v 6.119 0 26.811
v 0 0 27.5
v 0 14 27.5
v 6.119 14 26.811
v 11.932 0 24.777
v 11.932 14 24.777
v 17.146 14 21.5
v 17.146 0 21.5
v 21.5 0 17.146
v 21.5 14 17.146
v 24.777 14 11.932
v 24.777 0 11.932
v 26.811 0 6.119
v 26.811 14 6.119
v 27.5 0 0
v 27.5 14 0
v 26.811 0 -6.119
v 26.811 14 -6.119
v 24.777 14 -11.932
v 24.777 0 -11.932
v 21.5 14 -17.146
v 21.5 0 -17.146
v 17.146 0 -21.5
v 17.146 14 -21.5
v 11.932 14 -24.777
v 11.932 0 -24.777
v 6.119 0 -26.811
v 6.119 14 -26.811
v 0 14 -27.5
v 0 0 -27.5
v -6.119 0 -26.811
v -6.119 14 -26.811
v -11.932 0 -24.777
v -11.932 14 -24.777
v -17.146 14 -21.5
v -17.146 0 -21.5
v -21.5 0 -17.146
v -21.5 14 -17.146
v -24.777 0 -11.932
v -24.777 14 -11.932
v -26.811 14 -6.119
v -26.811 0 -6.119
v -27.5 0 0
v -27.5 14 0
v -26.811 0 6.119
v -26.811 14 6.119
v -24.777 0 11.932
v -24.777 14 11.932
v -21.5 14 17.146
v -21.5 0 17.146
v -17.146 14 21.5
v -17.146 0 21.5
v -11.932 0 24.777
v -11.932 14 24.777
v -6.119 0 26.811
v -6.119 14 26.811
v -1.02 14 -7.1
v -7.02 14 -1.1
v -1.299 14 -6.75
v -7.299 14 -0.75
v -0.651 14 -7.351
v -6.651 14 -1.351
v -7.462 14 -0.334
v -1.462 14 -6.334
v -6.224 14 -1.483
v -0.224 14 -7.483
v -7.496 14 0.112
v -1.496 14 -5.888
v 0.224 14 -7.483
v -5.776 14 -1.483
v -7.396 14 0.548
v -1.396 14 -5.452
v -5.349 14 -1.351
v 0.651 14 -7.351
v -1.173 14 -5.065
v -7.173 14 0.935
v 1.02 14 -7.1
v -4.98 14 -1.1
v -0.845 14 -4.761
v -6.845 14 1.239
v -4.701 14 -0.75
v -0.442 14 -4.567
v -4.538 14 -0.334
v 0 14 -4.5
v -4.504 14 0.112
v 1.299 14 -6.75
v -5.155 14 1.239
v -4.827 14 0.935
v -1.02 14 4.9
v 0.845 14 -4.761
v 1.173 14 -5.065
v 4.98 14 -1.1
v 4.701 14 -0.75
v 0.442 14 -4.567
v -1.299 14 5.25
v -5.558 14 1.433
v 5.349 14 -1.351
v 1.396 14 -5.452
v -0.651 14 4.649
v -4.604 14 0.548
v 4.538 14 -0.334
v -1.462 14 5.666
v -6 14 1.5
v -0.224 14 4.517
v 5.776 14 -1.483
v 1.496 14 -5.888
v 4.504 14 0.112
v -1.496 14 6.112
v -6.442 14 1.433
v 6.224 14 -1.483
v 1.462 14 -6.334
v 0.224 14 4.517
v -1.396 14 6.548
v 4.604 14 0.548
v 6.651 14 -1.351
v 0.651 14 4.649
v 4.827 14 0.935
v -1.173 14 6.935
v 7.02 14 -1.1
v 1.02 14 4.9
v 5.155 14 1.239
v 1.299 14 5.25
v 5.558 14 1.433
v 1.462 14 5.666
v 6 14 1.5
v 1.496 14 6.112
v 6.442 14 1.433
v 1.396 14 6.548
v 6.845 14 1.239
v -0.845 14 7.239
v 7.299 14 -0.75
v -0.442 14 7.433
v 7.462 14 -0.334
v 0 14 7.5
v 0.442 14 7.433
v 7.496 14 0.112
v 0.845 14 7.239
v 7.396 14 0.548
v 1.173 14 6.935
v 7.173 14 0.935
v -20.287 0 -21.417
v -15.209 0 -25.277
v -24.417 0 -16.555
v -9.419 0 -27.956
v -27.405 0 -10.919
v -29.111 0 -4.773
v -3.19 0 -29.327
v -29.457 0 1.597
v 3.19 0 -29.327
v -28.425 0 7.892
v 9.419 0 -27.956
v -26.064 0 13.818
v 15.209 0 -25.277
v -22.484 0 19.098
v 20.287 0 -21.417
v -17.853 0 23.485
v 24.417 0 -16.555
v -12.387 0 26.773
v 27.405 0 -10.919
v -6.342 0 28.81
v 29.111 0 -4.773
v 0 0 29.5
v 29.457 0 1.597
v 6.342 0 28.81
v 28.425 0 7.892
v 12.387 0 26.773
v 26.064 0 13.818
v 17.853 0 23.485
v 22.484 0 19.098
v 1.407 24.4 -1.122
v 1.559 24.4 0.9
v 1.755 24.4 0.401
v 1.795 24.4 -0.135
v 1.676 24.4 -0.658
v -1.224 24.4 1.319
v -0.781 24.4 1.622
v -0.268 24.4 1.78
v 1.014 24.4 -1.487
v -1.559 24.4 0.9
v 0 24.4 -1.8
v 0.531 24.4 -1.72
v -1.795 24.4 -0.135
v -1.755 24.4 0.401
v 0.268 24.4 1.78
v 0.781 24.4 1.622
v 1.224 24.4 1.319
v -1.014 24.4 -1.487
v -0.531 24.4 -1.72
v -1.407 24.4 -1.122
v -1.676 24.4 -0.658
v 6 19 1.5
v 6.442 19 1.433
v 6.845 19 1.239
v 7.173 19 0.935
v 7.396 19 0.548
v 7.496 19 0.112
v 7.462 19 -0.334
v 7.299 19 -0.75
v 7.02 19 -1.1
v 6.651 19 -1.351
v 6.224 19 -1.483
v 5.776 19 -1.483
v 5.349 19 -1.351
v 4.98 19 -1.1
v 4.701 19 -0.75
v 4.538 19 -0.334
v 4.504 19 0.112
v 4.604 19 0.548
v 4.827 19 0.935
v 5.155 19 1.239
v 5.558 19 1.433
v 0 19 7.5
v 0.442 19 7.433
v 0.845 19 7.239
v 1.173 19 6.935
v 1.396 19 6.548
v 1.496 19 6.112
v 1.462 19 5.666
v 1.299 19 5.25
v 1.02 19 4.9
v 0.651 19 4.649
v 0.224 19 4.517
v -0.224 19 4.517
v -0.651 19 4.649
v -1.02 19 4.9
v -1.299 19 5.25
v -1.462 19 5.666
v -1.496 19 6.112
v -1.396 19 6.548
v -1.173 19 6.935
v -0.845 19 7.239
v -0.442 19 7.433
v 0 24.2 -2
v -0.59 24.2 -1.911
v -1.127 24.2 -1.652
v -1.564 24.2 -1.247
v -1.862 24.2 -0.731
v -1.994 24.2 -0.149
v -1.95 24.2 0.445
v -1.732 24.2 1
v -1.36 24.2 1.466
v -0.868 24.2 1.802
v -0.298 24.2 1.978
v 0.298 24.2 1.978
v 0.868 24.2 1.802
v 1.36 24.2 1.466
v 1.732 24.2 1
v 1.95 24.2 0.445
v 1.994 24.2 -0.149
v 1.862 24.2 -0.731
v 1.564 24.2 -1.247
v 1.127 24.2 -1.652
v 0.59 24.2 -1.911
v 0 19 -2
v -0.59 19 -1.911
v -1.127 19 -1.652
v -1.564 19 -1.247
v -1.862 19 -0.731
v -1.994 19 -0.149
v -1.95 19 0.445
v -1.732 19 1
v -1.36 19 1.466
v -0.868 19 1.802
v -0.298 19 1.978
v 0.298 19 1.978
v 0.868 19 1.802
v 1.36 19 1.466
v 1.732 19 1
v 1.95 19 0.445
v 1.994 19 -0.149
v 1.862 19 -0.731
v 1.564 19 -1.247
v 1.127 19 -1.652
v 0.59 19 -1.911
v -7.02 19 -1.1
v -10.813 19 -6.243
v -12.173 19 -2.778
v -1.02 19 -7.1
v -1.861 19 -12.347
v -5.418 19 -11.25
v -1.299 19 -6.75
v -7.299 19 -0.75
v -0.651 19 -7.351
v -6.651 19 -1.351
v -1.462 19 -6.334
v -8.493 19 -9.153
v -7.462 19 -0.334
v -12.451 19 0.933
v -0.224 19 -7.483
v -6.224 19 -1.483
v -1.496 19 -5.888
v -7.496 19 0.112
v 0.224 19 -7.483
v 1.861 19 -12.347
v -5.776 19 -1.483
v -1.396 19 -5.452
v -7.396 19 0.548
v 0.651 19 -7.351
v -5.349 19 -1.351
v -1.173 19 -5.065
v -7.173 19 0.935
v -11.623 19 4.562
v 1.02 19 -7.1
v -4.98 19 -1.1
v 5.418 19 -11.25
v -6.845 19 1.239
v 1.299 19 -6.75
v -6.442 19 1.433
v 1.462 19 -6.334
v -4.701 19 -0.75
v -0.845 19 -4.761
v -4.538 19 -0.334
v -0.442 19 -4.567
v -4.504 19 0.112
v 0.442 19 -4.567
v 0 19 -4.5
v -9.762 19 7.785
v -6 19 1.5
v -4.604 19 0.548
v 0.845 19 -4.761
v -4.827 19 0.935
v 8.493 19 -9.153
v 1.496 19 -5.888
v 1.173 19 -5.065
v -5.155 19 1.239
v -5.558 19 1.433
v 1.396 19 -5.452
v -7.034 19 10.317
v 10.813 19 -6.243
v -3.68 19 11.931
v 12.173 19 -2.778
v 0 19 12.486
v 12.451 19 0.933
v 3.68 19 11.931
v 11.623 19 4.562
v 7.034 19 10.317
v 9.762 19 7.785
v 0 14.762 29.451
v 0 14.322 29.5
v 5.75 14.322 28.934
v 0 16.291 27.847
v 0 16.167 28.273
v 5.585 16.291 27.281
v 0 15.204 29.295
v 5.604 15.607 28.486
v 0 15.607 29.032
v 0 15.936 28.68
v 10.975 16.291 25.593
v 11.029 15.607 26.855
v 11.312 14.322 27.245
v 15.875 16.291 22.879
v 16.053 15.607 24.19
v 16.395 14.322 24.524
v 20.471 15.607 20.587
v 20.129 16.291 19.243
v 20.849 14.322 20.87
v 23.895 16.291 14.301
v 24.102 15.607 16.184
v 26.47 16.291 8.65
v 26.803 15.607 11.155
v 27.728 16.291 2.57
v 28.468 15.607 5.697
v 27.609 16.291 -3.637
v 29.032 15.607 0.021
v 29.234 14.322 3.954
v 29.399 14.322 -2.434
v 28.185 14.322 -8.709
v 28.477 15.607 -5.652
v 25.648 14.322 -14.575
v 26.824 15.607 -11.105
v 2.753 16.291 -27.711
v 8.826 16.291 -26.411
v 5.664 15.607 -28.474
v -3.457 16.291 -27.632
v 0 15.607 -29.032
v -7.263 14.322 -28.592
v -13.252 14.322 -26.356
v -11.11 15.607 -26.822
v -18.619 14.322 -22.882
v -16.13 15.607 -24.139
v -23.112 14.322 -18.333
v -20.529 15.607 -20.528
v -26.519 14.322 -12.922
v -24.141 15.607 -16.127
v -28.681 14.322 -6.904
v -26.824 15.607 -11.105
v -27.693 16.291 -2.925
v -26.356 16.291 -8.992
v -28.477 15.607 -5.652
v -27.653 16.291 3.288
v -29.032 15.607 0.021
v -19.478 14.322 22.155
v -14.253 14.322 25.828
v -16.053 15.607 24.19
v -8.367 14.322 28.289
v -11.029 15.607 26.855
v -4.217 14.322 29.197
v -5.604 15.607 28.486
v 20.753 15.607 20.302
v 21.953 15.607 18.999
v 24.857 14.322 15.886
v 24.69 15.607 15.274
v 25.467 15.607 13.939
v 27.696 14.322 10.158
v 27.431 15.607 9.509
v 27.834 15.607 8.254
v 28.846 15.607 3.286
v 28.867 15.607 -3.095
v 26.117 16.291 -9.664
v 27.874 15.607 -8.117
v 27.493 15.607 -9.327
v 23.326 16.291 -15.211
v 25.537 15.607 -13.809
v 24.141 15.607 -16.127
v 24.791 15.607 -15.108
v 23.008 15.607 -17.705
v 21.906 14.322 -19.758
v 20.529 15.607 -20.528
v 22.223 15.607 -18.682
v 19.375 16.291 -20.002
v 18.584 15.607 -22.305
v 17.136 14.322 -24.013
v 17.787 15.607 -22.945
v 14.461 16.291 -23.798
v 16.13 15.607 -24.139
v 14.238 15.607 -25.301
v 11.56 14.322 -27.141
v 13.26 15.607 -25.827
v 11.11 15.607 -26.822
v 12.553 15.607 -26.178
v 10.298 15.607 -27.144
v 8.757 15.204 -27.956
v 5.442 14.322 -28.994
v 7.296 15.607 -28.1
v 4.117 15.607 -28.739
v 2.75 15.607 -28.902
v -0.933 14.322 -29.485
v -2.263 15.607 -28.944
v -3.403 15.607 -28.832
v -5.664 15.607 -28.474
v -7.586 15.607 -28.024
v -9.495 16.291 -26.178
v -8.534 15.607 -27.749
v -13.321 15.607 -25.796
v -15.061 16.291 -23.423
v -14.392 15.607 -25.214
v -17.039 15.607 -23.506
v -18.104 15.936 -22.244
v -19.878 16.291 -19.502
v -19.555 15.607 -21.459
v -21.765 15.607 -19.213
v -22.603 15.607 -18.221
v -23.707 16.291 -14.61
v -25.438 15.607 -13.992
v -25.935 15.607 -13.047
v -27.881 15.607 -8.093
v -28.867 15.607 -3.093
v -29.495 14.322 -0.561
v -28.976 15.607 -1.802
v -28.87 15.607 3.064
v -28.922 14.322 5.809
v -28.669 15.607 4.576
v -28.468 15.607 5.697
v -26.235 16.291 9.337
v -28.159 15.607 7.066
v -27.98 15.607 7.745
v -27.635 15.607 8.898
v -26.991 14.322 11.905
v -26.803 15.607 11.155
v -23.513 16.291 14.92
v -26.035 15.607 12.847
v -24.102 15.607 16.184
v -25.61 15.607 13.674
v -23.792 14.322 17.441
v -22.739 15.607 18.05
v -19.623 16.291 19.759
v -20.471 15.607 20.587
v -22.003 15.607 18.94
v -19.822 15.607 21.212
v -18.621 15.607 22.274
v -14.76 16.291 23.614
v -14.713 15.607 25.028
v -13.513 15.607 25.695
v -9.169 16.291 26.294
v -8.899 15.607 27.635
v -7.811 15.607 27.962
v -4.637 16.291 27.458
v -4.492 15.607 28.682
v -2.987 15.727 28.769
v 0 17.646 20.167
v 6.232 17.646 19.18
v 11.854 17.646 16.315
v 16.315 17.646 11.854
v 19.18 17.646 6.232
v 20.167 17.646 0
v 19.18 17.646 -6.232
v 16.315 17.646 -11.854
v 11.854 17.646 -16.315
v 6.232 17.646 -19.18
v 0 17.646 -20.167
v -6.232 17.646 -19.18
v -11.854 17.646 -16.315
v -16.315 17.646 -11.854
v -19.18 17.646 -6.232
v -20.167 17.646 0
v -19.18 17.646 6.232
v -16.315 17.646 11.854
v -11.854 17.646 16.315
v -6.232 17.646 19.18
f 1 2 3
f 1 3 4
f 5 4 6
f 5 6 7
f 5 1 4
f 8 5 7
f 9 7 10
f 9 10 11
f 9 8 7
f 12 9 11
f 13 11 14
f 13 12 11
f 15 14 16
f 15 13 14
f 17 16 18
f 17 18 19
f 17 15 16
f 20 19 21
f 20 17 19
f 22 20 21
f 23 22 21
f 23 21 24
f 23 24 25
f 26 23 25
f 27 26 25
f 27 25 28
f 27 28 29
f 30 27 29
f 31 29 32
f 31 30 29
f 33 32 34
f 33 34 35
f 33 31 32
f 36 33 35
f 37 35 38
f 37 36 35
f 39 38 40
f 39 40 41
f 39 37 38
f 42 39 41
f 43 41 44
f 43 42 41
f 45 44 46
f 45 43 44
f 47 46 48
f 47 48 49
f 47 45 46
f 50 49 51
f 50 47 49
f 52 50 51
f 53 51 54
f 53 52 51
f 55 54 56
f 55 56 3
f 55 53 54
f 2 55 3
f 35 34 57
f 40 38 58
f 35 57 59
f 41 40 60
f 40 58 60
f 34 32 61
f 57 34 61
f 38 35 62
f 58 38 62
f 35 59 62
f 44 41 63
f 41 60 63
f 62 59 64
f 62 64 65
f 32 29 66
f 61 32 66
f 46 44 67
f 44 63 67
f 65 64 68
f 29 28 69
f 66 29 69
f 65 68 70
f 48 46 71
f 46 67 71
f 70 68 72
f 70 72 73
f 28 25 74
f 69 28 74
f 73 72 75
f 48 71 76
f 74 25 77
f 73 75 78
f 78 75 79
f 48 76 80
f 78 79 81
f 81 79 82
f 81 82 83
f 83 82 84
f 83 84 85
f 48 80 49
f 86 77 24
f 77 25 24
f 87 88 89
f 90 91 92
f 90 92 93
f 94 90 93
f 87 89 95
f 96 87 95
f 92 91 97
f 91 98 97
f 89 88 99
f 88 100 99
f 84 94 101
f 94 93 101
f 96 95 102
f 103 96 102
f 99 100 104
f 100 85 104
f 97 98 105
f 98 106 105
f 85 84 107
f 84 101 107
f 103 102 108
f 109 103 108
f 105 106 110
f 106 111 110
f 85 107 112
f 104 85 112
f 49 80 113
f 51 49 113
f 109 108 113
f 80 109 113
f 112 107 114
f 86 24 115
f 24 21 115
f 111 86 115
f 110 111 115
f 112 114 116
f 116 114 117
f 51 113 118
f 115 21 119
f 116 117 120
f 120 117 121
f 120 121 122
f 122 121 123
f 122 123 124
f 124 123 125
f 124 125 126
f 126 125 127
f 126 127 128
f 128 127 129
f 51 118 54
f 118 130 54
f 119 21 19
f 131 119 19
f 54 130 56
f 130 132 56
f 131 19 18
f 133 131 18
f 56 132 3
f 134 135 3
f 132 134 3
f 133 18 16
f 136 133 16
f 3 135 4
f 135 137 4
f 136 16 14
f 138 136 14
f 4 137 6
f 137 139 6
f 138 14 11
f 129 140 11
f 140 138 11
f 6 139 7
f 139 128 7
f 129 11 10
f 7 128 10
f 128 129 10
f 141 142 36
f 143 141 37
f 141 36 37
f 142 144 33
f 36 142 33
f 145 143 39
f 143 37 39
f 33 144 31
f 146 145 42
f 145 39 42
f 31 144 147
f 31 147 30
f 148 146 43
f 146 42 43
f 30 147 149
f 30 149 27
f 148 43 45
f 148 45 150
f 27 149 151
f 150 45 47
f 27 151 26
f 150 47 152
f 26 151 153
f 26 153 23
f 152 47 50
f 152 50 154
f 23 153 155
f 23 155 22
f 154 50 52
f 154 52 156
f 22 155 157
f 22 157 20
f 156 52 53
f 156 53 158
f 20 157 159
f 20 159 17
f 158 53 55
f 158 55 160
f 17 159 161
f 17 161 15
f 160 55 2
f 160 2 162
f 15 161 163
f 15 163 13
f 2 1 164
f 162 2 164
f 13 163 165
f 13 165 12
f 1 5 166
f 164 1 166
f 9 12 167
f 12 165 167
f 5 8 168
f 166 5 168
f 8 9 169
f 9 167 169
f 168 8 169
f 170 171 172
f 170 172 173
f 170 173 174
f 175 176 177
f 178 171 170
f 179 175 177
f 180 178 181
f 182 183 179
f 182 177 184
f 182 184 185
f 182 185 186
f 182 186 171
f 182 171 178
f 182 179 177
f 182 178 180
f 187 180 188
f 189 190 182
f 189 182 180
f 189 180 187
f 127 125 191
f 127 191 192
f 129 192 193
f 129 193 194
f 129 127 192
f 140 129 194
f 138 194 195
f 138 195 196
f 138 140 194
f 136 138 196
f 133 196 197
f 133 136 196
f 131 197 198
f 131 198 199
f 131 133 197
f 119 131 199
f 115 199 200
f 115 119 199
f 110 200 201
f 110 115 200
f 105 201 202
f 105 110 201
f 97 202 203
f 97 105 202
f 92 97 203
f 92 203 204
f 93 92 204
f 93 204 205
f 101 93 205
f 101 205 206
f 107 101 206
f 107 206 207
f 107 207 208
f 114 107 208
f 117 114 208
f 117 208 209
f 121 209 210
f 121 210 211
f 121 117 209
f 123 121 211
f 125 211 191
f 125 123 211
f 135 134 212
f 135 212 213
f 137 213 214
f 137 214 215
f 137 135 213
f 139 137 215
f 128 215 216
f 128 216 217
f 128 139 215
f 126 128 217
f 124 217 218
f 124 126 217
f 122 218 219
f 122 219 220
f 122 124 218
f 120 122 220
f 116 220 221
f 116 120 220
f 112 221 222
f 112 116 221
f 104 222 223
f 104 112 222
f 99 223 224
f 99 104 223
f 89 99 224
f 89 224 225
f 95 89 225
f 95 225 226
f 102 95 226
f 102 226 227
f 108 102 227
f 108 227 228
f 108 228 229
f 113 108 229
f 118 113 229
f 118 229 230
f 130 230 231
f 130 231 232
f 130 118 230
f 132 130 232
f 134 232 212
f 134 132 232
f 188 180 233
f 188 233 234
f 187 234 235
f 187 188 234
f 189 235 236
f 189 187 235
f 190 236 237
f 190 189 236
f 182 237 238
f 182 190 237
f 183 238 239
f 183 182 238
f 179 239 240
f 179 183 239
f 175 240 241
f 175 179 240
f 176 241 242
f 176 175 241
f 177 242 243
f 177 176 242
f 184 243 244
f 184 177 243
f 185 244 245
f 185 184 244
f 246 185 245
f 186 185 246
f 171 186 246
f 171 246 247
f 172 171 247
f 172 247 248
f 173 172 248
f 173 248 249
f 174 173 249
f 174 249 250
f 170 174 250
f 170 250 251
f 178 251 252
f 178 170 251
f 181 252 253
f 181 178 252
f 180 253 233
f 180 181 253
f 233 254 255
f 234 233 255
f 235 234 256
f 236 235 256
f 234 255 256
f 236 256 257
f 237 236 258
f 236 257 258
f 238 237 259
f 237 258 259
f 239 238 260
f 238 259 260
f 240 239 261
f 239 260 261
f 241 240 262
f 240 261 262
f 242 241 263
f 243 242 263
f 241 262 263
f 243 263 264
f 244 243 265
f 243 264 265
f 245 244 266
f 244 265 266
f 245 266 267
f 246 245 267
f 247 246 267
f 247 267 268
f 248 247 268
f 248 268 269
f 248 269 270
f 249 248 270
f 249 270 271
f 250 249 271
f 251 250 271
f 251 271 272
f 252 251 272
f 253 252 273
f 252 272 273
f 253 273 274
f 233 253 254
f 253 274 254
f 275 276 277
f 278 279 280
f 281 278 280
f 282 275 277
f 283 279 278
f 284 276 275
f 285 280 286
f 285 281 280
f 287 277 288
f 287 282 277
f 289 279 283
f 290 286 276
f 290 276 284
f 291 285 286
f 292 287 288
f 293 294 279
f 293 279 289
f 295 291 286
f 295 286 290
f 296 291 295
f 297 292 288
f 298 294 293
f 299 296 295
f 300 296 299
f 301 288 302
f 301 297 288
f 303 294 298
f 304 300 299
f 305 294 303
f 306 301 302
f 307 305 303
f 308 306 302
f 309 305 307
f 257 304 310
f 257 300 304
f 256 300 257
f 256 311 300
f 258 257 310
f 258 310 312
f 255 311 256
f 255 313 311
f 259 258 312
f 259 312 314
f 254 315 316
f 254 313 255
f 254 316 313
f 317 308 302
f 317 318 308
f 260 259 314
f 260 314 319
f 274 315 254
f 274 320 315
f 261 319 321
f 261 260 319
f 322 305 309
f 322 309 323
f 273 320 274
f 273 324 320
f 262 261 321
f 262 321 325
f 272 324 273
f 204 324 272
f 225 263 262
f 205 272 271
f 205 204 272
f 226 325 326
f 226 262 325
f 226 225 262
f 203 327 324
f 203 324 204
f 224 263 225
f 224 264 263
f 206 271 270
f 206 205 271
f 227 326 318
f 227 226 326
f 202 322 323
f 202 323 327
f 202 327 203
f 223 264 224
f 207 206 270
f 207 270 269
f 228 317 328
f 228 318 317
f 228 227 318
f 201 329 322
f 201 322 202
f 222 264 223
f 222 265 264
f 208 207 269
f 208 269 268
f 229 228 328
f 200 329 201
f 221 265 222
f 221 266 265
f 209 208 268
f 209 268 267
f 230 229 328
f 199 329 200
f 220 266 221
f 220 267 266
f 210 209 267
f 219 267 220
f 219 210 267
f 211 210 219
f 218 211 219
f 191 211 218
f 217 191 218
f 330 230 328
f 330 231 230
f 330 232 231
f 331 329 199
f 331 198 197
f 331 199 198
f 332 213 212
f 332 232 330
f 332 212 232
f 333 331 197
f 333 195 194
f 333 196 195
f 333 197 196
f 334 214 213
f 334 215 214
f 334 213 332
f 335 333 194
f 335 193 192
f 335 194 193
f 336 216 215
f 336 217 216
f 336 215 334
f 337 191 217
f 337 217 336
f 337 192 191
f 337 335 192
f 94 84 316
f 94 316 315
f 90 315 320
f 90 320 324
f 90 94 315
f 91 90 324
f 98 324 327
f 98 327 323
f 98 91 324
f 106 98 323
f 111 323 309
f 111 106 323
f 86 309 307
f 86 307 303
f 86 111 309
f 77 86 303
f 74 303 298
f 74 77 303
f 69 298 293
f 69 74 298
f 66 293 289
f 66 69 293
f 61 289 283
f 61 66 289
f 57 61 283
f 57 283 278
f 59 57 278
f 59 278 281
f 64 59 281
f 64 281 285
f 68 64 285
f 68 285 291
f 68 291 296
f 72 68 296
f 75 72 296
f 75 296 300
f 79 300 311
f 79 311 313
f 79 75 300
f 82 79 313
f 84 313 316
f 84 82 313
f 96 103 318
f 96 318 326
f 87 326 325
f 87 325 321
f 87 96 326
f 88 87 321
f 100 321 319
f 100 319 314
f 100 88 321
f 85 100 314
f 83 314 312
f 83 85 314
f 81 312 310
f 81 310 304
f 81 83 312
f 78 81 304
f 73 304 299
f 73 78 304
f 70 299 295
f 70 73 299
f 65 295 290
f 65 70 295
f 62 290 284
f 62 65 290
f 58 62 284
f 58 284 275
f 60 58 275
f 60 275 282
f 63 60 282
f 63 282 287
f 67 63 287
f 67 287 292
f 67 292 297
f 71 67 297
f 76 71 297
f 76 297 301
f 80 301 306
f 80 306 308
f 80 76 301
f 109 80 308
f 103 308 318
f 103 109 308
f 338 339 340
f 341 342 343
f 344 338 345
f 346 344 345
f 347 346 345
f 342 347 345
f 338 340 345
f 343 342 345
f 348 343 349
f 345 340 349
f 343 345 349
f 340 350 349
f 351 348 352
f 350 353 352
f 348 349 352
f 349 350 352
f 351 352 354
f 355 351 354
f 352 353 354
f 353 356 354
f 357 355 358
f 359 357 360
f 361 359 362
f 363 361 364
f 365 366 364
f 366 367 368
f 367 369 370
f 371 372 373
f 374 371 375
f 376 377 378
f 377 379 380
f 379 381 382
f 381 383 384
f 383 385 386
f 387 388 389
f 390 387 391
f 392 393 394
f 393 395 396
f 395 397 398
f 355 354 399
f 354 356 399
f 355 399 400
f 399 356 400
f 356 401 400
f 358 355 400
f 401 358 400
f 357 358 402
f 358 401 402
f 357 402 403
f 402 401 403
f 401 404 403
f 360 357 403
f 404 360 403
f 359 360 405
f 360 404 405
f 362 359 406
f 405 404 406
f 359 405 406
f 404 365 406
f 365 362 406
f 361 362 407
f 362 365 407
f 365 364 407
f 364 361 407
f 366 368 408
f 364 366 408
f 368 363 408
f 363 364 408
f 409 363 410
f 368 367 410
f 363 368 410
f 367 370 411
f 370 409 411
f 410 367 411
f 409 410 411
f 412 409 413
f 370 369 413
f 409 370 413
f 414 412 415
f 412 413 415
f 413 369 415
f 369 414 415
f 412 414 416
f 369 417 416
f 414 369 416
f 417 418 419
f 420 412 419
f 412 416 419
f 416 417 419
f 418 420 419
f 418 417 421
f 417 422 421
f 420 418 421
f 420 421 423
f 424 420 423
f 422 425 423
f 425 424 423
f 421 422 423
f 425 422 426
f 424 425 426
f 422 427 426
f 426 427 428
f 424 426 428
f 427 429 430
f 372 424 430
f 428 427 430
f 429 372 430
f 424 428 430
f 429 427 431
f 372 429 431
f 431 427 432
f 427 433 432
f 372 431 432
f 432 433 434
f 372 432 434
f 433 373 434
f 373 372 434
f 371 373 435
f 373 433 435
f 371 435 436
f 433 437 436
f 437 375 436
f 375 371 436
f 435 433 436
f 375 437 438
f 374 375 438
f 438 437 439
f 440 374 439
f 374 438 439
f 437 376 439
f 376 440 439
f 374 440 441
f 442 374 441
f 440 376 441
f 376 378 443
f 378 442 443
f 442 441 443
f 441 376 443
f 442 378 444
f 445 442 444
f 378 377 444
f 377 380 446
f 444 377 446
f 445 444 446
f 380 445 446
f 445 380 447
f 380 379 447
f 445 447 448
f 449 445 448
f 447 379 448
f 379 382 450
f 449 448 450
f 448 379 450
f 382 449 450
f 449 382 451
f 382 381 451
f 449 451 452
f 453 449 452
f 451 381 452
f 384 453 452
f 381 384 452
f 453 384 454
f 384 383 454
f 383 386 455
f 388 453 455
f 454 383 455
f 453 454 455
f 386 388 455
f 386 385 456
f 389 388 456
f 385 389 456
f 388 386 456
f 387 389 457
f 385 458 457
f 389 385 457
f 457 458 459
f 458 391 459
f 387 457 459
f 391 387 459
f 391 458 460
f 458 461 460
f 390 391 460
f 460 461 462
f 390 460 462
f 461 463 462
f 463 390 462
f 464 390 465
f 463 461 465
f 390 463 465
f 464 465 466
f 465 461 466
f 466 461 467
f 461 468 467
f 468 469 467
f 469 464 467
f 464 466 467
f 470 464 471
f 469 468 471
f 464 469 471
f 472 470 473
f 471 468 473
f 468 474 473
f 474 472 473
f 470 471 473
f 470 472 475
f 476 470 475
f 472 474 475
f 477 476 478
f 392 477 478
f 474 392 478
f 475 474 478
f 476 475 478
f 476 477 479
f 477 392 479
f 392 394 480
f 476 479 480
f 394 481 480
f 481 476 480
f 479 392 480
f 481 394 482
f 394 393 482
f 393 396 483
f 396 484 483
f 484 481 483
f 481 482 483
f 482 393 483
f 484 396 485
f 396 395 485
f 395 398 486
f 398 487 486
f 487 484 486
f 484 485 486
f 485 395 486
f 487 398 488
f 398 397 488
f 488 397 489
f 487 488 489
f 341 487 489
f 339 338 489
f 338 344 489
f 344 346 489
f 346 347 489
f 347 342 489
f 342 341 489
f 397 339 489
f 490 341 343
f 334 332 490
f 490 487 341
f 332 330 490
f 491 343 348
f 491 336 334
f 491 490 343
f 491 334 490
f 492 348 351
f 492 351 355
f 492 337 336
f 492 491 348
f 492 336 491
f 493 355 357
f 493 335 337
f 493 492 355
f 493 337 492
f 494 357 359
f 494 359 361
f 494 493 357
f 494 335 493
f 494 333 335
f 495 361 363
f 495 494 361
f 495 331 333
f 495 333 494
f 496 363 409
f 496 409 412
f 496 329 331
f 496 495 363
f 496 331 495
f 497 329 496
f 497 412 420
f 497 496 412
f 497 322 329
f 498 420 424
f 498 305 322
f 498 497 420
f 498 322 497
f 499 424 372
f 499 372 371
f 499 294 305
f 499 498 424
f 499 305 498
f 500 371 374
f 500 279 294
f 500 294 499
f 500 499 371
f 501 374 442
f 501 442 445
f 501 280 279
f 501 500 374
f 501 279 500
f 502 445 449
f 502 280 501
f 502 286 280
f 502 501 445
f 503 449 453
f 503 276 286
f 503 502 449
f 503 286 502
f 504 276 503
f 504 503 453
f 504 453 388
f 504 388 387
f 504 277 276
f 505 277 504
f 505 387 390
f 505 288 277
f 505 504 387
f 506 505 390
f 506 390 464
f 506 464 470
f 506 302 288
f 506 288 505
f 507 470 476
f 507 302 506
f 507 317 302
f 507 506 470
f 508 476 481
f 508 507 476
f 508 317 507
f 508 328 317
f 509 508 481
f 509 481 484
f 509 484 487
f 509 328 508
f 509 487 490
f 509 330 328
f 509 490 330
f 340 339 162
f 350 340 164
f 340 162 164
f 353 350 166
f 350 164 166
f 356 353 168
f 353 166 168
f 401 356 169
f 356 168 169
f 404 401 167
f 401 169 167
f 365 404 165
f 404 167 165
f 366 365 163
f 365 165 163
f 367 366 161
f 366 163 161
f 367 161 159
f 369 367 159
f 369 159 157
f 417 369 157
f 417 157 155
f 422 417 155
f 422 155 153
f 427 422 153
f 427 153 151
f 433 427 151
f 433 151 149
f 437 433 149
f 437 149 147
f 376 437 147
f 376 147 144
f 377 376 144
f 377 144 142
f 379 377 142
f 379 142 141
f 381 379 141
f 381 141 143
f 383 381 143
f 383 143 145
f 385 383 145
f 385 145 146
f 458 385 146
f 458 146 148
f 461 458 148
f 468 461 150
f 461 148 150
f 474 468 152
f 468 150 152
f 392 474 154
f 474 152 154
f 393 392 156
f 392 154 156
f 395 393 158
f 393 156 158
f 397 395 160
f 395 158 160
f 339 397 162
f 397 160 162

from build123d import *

# Parameters (mm, degrees)
SKETCH1_R           = 29.5
SKETCH1_R_2         = 27.5
BOSS_EXTRUDE2_DEPTH = 14
SKETCH3_R           = 29.5
SKETCH3_R_2         = 1.5
BOSS_EXTRUDE3_DEPTH = 5
CHAMFER1_SIZE       = 3
CHAMFER1_SIZE2      = 17.013845459
FILLET1_R           = 2
SKETCH4_R           = 2
BOSS_EXTRUDE4_DEPTH = 5.4
CHAMFER2_SIZE       = 0.2


with BuildPart() as part:
    # Sketch1 → Boss-Extrude2 (new body)
    with BuildSketch(Plane(origin=(0, 0, 0), x_dir=(1, 0, 0), z_dir=(0, 1, 0))):
        with Locations(Location((0, 0, 0), (0, 0, 270))):
            Circle(SKETCH1_R)
        with Locations(Location((0, 0, 0), (0, 0, 270))):
            Circle(SKETCH1_R_2, mode=Mode.SUBTRACT)
    extrude(amount=BOSS_EXTRUDE2_DEPTH)

    # Sketch3 → Boss-Extrude3 (add)
    with BuildSketch(Plane(origin=(0, 14, 0), x_dir=(1, 0, 0), z_dir=(0, 1, 0))):
        with Locations(Location((0, 0, 0), (0, 0, 270))):
            Circle(SKETCH3_R)
        with Locations(Location((0, 6, 0), (0, 0, 270))):
            Circle(SKETCH3_R_2, mode=Mode.SUBTRACT)
        with Locations(Location((6, 0, 0), (0, 0, 270))):
            Circle(SKETCH3_R_2, mode=Mode.SUBTRACT)
        with Locations(Location((0, -6, 0), (0, 0, 270))):
            Circle(SKETCH3_R_2, mode=Mode.SUBTRACT)
        with Locations(Location((-6, 0, 0), (0, 0, 270))):
            Circle(SKETCH3_R_2, mode=Mode.SUBTRACT)
    extrude(amount=BOSS_EXTRUDE3_DEPTH)

    # Chamfer1
    chamfer1_edges = [part.edges().sort_by_distance(p)[0] for p in [
        (0, 19, -29.5),
    ]]
    chamfer1_side = [part.faces().sort_by_distance(p)[0] for p in [
        (0, 9.5, -29.5),
    ]]
    chamfer(chamfer1_edges, length=CHAMFER1_SIZE, length2=CHAMFER1_SIZE2, reference=chamfer1_side[0])

    # Fillet1
    fillet1_edges = [part.edges().sort_by_distance(p)[0] for p in [
        (0, 16, -29.5),
    ]]
    fillet(fillet1_edges, radius=FILLET1_R)

    # Sketch4 → Boss-Extrude4 (add)
    with BuildSketch(Plane(origin=(0, 19, 0), x_dir=(1, 0, 0), z_dir=(0, 1, 0))):
        with Locations(Location((0, 0, 0), (0, 0, 90))):
            Circle(SKETCH4_R)
    extrude(amount=BOSS_EXTRUDE4_DEPTH)

    # Chamfer2
    chamfer2_edges = [part.edges().sort_by_distance(p)[0] for p in [
        (0, 24.4, 2),
    ]]
    chamfer(chamfer2_edges, length=CHAMFER2_SIZE)


solid = part.part
